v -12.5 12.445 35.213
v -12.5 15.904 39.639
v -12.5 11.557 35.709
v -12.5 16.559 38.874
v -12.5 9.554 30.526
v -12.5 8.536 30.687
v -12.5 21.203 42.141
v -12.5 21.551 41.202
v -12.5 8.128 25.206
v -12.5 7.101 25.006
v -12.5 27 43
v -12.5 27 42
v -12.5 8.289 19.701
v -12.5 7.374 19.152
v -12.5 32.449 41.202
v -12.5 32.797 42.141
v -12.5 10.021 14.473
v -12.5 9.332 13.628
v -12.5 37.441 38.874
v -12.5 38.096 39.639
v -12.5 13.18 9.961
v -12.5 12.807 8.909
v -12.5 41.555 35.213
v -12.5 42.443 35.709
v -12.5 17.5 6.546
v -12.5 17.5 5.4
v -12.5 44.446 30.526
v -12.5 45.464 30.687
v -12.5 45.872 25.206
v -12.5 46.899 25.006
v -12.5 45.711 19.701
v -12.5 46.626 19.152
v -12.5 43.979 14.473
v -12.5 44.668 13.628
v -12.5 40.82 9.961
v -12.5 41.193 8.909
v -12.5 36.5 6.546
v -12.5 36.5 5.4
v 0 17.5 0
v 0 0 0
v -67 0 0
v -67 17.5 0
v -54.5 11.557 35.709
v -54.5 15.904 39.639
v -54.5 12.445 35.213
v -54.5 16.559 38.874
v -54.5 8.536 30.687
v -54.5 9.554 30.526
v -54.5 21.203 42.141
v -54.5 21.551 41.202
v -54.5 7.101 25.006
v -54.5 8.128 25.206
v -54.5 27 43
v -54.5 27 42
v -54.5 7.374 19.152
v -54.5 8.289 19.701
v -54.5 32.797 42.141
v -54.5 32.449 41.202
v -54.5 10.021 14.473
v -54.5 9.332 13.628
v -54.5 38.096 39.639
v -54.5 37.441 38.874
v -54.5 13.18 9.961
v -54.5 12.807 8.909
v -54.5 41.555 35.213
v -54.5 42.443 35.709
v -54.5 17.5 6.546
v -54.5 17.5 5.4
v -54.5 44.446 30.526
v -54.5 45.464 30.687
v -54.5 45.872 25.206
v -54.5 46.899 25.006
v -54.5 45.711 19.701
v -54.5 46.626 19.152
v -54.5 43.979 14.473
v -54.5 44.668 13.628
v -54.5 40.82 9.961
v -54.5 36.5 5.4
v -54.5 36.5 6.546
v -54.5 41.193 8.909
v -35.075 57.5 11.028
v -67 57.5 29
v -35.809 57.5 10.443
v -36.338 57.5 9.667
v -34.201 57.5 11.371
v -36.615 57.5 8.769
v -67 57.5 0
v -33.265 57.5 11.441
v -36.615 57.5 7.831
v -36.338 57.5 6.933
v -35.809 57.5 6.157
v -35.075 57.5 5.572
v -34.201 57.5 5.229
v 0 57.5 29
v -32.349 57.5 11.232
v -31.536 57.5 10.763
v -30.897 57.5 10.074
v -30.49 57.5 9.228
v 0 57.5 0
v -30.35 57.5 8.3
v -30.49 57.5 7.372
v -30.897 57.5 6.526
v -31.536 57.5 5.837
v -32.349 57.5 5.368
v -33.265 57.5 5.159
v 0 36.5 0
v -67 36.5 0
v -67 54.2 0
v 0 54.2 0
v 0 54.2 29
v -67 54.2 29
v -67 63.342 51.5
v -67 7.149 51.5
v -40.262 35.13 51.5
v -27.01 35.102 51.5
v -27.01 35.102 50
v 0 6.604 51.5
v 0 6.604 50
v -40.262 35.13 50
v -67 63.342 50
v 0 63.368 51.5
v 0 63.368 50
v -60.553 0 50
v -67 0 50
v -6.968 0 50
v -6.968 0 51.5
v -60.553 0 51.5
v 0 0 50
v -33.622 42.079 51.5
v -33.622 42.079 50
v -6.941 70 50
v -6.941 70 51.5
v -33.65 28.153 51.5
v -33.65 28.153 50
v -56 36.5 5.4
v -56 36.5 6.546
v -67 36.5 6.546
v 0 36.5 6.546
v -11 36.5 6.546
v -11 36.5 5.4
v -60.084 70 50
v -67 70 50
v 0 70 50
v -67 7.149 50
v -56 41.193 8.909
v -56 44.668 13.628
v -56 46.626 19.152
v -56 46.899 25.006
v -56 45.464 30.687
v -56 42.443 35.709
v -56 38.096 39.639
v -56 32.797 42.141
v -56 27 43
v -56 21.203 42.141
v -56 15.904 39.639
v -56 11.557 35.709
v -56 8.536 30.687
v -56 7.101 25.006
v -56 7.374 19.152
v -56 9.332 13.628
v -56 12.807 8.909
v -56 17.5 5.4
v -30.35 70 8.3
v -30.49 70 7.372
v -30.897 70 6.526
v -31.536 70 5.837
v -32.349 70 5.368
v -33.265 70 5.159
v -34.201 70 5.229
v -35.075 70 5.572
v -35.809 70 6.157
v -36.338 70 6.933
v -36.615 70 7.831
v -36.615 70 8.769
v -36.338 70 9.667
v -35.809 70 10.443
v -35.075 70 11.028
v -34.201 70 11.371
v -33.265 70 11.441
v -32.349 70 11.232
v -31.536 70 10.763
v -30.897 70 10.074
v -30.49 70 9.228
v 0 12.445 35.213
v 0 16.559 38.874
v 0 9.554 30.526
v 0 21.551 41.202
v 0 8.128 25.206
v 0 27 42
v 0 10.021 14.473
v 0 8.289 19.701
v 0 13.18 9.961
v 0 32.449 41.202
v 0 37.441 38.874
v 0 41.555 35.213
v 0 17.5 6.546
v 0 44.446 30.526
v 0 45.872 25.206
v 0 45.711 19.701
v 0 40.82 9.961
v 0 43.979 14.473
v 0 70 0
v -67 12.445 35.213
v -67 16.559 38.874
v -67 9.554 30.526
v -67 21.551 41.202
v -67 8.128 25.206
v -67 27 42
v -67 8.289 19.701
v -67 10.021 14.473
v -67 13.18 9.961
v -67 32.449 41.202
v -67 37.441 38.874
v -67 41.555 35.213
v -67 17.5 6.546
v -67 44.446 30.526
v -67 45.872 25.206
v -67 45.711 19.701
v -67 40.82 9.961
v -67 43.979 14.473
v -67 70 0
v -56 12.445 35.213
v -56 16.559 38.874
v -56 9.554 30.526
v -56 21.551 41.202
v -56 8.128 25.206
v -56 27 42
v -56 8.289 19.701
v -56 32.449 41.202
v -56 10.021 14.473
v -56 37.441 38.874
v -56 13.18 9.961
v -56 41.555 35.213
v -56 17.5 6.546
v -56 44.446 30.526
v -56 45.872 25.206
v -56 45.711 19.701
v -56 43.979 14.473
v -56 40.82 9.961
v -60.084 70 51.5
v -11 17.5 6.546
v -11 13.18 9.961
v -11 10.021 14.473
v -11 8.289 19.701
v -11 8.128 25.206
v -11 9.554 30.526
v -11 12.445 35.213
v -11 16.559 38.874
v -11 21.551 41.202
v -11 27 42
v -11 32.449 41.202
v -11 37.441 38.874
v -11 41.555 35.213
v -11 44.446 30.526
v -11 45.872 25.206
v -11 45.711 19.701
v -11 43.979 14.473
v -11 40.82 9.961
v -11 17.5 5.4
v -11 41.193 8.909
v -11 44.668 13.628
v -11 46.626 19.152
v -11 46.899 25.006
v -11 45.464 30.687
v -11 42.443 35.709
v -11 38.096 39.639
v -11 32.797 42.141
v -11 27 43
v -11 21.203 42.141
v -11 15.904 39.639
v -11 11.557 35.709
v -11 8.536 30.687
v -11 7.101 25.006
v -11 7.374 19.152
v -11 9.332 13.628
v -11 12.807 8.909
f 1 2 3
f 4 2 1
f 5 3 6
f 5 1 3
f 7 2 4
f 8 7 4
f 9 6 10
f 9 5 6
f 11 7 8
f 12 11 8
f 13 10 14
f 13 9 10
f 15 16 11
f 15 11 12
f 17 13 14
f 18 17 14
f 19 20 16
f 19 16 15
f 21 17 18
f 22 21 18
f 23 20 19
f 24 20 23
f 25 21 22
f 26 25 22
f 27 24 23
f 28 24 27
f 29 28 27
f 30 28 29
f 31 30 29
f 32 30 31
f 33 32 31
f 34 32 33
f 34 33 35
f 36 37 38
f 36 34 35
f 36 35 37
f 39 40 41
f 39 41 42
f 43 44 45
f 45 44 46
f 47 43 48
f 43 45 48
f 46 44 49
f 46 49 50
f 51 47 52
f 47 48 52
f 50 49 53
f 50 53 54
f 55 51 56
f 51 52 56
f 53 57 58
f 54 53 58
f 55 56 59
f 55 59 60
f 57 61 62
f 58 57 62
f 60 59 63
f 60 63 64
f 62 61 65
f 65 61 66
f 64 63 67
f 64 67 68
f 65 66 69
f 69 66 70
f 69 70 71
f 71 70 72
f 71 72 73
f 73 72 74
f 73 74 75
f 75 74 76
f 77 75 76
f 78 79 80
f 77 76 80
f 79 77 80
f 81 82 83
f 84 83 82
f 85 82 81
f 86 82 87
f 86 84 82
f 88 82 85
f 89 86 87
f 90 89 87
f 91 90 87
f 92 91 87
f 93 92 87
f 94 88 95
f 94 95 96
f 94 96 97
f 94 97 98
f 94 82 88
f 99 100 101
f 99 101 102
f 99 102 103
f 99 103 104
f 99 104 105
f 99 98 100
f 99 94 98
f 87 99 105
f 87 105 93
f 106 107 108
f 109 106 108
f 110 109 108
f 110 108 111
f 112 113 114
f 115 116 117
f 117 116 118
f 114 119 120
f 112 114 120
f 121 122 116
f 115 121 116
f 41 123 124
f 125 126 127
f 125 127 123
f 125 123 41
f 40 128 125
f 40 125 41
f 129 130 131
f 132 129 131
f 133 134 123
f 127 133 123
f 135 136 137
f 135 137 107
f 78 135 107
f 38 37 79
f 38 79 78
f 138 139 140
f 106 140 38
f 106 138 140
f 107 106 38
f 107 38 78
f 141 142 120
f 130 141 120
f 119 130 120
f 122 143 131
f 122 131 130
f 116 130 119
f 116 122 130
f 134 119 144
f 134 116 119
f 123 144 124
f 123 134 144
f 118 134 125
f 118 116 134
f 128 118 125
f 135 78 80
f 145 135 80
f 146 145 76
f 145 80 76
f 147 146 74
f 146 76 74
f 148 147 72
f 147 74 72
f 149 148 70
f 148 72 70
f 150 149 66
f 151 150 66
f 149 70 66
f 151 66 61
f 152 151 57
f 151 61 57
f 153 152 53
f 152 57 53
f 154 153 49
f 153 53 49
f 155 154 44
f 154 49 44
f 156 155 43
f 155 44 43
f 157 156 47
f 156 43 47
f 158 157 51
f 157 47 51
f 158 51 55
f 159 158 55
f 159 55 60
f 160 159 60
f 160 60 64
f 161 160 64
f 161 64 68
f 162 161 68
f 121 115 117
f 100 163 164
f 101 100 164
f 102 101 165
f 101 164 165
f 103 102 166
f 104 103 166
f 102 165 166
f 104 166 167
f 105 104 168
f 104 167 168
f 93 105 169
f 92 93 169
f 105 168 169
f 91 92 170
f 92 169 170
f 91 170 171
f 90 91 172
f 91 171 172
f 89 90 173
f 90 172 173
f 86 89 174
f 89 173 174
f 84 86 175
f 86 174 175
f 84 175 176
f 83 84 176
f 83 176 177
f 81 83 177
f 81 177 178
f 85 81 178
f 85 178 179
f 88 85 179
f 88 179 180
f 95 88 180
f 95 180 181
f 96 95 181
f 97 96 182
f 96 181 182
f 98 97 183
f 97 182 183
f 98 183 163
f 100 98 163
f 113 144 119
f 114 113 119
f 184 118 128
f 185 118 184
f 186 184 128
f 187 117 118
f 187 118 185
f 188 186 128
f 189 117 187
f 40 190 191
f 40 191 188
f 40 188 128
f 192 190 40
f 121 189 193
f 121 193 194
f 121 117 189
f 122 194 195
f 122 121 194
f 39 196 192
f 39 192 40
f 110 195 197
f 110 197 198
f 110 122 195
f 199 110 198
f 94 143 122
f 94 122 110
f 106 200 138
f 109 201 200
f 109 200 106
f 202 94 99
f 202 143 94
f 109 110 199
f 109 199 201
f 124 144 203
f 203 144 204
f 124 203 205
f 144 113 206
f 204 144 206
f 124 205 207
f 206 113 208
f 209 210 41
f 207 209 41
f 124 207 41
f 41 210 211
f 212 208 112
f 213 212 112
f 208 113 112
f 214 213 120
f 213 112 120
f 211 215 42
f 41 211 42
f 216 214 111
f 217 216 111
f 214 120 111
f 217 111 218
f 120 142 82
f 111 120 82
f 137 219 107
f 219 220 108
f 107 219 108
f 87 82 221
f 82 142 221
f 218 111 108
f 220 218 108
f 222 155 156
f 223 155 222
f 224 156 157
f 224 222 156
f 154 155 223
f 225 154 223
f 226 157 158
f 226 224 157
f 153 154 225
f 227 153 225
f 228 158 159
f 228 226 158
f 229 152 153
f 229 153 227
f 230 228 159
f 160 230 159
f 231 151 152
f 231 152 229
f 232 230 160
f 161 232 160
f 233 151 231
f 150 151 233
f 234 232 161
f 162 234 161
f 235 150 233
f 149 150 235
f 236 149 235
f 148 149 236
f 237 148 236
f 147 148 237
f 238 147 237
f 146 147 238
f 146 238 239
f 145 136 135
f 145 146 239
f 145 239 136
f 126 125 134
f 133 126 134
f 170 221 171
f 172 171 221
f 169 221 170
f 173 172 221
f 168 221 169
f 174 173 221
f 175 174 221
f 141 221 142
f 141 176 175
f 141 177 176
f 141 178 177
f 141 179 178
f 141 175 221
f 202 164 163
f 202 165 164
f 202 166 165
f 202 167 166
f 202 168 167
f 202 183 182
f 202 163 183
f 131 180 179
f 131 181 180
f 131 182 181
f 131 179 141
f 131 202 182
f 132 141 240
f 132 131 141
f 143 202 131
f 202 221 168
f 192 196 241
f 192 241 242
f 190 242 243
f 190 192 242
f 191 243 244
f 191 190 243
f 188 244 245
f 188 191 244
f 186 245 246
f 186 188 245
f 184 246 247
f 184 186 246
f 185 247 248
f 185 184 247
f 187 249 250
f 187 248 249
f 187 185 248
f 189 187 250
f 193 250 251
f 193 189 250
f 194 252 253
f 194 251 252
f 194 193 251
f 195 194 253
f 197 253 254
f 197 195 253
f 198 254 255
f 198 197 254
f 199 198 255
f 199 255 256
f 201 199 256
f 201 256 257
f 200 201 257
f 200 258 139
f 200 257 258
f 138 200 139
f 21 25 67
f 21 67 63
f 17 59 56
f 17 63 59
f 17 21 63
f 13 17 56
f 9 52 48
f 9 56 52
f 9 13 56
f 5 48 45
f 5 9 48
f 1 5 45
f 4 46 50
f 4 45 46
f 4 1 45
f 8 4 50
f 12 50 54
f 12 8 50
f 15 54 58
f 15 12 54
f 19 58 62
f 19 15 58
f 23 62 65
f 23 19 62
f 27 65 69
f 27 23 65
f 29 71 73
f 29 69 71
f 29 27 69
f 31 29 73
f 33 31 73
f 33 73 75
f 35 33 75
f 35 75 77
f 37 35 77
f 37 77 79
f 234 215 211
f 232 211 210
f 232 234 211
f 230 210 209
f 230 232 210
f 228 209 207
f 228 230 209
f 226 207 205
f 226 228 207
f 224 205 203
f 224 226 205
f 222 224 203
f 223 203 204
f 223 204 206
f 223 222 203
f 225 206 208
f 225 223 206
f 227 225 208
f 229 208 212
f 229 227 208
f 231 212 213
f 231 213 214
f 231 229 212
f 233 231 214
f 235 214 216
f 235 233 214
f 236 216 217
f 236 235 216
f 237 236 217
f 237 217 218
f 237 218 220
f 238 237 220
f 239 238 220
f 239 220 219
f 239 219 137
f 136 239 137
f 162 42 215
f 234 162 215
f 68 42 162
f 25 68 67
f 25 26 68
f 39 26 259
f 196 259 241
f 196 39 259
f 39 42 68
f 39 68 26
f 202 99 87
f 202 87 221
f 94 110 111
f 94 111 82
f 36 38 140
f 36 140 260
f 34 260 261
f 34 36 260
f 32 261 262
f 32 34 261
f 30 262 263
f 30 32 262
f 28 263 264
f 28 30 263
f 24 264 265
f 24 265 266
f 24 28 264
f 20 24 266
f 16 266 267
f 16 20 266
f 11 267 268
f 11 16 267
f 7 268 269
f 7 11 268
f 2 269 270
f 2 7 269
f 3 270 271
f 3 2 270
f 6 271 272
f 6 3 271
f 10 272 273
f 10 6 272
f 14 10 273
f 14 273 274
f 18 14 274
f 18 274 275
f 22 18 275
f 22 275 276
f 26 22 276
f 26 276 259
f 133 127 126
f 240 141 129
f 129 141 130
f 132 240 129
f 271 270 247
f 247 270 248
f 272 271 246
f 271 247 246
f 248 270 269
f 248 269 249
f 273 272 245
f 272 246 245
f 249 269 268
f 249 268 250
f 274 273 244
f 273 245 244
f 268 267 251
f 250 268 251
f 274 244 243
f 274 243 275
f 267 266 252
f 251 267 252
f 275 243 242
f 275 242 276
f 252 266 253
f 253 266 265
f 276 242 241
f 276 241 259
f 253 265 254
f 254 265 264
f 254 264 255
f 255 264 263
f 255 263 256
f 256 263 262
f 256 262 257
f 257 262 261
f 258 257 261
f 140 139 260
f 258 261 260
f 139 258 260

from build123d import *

# Parameters (mm, degrees)
BOSS_EXTRUDE1_DEPTH = 67
SKETCH2_R           = 20
CUT_EXTRUDE1_DEPTH  = 1.5
BOSS_EXTRUDE3_DEPTH = 1.5
SKETCH8_R           = 3.15
CUT_EXTRUDE2_DEPTH  = 12.5


with BuildPart() as part:
    # Sketch1 → Boss-Extrude1 (new body)
    with BuildSketch(Plane(origin=(0, 0, 0), x_dir=(0, 0, -1), z_dir=(1, 0, 0))):
        with BuildLine():
            Line((0, 70), (-50, 70))
            Line((-50, 70), (-50, 0))
            Line((-50, 0), (0, 0))
            Line((0, 0), (0, 17.5))
            Line((0, 17.5), (-6.545517328, 17.5))
            ThreePointArc((-6.545517328, 17.5), (-42, 27), (-6.545517328, 36.5))
            Line((-6.545517328, 36.5), (0, 36.5))
            Line((0, 36.5), (0, 54.2))
            Line((0, 54.2), (-29, 54.2))
            Line((-29, 54.2), (-29, 57.5))
            Line((-29, 57.5), (0, 57.5))
            Line((0, 57.5), (0, 70))
        make_face()
    extrude(amount=-BOSS_EXTRUDE1_DEPTH)

    # Sketch2 → Cut-Extrude1 (cut)
    with BuildSketch(Plane(origin=(-12.5, 0, 0), x_dir=(0, 0, -1), z_dir=(1, 0, 0))):
        with Locations((-23, 27)):
            Circle(SKETCH2_R)
    cut_extrude1 = extrude(amount=CUT_EXTRUDE1_DEPTH, mode=Mode.SUBTRACT)

    # Mirror1: Cut-Extrude1 across plane
    add(cut_extrude1.mirror(Plane(origin=(-33.5, 0, 0), x_dir=(0, 0, 1), z_dir=(1, 0, 0))), mode=Mode.SUBTRACT)

    # Sketch7 → Boss-Extrude3 (add)
    with BuildSketch(Plane.XY.offset(50)):
        Polygon((-60.553250223, 0), (-6.967587392, 0), (-33.650176709, 28.153479174), align=None)
        Polygon((0, 6.603562983), (0, 63.367654561), (-27.0098942, 35.102389871), align=None)
        Polygon((-67, 63.341726624), (-67, 7.149153864), (-40.262049953, 35.129834934), align=None)
        Polygon((-6.940604727, 70), (-60.084264634, 70), (-33.621767444, 42.078745631), align=None)
    extrude(amount=BOSS_EXTRUDE3_DEPTH)

    # Sketch8 → Cut-Extrude2 (cut)
    with BuildSketch(Plane(origin=(0, 70, 0), x_dir=(1, 0, 0), z_dir=(0, 1, 0))):
        with Locations((-33.5, -8.3)):
            Circle(SKETCH8_R)
    extrude(amount=-CUT_EXTRUDE2_DEPTH, mode=Mode.SUBTRACT)


solid = part.part
